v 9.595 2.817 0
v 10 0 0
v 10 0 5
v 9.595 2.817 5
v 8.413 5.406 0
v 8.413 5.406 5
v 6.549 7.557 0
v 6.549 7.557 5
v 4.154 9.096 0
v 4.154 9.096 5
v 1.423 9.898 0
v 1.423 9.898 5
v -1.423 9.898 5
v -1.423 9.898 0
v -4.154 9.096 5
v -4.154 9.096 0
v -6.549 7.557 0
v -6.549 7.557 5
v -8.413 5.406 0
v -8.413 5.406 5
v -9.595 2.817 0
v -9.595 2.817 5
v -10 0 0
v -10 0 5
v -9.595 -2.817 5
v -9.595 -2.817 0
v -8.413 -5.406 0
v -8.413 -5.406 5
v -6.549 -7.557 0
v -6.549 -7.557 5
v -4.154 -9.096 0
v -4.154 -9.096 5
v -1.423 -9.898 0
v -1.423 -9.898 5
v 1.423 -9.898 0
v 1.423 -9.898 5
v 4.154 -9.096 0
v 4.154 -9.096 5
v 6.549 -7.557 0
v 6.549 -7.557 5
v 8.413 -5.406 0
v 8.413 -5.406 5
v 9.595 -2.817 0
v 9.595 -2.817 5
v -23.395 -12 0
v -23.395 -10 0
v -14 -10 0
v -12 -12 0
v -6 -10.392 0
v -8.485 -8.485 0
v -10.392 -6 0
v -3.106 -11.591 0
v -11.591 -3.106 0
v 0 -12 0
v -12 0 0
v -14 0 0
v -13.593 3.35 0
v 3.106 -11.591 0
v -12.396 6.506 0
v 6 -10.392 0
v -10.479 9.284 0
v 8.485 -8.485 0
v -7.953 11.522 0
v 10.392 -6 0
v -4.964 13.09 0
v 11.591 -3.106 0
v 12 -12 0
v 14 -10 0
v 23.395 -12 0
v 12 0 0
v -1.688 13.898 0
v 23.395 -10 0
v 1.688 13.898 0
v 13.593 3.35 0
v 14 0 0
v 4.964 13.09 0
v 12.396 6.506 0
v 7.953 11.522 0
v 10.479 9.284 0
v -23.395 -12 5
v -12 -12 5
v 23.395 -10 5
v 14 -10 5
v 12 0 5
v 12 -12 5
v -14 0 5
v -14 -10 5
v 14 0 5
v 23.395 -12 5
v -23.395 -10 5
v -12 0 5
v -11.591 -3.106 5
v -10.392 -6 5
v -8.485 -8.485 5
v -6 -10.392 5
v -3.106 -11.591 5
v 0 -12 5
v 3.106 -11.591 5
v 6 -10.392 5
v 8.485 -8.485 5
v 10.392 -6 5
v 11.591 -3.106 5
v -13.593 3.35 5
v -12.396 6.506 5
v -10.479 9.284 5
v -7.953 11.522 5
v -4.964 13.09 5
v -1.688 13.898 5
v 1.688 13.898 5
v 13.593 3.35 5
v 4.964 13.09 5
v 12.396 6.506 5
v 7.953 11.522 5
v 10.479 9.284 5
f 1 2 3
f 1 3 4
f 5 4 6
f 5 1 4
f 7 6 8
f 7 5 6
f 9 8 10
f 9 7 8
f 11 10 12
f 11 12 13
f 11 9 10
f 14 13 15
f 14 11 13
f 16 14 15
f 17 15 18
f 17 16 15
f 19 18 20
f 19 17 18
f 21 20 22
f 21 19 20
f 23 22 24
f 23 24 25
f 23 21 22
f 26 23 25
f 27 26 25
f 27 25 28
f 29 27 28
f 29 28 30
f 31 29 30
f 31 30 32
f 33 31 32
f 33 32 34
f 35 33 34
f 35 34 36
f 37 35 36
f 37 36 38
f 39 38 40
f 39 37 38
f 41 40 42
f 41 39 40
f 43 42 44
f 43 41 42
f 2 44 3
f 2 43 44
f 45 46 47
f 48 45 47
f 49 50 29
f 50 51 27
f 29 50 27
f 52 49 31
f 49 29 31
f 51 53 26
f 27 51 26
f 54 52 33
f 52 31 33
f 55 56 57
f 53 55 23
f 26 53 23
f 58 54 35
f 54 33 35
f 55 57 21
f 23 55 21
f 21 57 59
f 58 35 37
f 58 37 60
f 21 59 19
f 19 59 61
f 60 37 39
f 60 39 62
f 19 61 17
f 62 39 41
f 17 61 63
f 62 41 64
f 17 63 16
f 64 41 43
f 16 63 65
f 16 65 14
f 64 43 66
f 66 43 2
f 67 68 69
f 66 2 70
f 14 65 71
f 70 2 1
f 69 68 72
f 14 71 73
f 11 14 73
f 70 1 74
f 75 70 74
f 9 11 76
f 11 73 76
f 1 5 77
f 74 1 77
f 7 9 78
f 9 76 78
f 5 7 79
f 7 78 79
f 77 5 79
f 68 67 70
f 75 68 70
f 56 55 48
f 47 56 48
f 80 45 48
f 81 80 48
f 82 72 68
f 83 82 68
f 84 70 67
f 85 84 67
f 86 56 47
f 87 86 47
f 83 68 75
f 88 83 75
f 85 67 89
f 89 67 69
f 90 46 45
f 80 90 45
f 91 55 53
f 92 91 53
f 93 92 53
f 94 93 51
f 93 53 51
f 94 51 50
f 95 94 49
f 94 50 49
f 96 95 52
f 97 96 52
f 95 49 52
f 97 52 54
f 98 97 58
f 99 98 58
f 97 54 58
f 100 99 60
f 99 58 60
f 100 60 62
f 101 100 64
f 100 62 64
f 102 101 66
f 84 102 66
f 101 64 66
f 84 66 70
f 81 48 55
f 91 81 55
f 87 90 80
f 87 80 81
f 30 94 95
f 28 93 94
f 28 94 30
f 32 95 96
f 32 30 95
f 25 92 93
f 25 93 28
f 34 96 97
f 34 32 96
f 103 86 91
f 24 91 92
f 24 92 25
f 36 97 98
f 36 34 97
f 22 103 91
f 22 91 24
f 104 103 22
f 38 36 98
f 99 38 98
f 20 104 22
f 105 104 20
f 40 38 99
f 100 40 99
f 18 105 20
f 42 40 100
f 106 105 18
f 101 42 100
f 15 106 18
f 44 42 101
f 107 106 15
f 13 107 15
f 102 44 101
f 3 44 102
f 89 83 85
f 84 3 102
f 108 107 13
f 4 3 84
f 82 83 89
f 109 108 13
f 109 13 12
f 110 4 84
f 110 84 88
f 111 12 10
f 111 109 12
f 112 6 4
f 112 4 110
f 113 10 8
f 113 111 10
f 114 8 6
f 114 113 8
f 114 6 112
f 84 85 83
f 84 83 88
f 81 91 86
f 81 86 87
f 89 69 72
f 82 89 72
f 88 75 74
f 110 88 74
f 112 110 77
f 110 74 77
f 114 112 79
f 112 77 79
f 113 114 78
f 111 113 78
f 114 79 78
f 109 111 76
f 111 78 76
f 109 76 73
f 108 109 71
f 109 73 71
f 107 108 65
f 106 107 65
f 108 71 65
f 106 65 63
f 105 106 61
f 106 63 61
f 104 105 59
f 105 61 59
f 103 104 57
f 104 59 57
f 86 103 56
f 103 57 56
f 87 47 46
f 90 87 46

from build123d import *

# Parameters (mm, degrees)
SKETCH1_R           = 12
SKETCH1_R_2         = 10
BOSS_EXTRUDE1_DEPTH = 5


with BuildPart() as part:
    # Sketch1 → Boss-Extrude1 (new body)
    # profile 1 of 2: a face of its own
    with BuildSketch(Plane.XY):
        with BuildLine():
            Line((-12, -12), (-12, 0))
            ThreePointArc((-12, 0), (0, 12), (12, 0))
            Line((12, 0), (12, -12))
            Line((12, -12), (23.395271001, -12))
            Line((23.395271001, -12), (23.395271001, -10))
            Line((23.395271001, -10), (14, -10))
            Line((14, -10), (14, 0))
            ThreePointArc((14, 0), (0, 14), (-14, 0))
            Line((-14, 0), (-14, -10))
            Line((-14, -10), (-23.395271001, -10))
            Line((-23.395271001, -10), (-23.395271001, -12))
            Line((-23.395271001, -12), (-12, -12))
        make_face()
    # profile 2 of 2: a face of its own
    with BuildSketch(Plane.XY):
        Circle(SKETCH1_R)
        Circle(SKETCH1_R_2, mode=Mode.SUBTRACT)
    extrude(amount=BOSS_EXTRUDE1_DEPTH)


solid = part.part
